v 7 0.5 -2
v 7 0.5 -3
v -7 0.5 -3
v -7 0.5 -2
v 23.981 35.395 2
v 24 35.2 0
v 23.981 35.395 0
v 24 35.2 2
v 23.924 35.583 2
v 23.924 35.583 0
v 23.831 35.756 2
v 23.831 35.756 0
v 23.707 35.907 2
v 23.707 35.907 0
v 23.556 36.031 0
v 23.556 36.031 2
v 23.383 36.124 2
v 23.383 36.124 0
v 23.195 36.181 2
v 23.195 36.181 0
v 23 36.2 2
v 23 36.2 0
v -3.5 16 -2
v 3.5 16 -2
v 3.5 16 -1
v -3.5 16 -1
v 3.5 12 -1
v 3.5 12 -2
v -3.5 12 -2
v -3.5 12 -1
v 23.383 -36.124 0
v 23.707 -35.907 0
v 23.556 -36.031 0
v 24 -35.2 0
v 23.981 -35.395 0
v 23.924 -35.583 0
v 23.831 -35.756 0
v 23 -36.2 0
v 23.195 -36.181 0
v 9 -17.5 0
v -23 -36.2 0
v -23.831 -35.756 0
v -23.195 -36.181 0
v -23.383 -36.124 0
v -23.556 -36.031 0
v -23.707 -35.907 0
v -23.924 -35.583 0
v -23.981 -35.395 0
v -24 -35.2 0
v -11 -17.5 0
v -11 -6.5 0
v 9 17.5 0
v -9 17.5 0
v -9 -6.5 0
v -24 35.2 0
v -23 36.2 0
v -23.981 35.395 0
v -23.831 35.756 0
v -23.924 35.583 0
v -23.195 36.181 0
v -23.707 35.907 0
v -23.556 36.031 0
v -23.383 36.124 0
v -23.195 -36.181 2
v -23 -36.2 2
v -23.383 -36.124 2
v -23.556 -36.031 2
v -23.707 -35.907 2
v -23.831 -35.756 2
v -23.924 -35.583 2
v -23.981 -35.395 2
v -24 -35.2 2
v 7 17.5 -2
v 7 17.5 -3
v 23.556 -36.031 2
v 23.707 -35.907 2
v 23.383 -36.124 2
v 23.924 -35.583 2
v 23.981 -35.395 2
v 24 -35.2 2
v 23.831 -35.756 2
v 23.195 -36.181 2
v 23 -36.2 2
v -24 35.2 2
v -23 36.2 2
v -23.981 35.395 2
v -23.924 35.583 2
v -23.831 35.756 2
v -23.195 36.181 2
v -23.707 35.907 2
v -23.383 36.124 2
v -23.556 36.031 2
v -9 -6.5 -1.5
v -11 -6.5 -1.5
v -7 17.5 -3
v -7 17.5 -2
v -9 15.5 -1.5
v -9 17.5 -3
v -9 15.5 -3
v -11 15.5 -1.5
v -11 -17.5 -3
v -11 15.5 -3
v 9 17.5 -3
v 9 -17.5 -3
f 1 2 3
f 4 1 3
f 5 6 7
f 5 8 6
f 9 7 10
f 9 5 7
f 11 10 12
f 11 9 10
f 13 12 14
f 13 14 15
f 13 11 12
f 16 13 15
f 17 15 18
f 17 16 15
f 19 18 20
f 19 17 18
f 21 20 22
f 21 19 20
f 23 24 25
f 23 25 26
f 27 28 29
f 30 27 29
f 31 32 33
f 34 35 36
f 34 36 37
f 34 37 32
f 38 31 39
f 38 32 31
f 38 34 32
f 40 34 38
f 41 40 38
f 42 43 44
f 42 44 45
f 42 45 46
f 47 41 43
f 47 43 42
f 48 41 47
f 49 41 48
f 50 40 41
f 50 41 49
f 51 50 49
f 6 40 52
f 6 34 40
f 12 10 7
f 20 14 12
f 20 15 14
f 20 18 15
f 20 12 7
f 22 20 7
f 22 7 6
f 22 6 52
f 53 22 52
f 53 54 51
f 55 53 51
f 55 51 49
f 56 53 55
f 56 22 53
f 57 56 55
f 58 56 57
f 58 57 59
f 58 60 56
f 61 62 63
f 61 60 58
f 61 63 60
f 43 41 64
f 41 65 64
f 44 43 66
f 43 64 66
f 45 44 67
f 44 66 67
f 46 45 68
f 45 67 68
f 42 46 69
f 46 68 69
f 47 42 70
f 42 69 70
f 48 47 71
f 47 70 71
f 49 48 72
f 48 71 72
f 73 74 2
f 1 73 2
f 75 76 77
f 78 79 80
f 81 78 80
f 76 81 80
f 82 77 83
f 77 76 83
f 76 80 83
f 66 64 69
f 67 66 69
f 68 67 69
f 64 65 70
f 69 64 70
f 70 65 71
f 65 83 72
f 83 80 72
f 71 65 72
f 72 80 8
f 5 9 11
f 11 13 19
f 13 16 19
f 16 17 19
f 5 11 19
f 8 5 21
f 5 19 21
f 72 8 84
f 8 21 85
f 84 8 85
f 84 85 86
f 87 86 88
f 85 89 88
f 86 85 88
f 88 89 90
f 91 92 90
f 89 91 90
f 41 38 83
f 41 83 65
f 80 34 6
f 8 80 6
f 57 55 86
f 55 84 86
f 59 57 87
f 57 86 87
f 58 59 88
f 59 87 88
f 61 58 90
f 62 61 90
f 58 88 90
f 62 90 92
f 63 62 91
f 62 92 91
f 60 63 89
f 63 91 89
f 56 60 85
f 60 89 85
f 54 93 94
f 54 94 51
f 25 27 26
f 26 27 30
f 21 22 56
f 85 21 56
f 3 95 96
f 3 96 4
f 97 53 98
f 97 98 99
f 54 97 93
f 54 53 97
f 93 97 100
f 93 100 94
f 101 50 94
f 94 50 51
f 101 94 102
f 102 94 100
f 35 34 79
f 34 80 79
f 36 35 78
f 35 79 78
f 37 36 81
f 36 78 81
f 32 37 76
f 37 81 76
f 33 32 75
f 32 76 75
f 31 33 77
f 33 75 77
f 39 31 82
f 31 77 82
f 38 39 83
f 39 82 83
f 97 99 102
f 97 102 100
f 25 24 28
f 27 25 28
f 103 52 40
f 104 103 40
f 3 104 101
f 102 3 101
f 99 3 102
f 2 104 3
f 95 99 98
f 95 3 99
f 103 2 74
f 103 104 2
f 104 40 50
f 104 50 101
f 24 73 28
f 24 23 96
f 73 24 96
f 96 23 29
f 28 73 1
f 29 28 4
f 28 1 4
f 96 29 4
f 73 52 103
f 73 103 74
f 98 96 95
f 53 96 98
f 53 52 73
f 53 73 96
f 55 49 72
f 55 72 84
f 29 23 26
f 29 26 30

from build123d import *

# Parameters (mm, degrees)
SKETCH_W        = 48
SKETCH_H        = 72.4
PAD_DEPTH       = 2
FILLET_R        = 1
SKETCH001_W     = 18
SKETCH001_H     = 35
PAD001_DEPTH    = 3
SKETCH002_W     = 14
SKETCH002_H     = 17
POCKET_DEPTH    = 1
SKETCH003_W     = 7
SKETCH003_H     = 4
POCKET001_DEPTH = 1
PAD002_DEPTH    = 2


with BuildPart() as ailettes:
    # Sketch → Pad (new body)
    with BuildSketch(Plane.XY):
        Rectangle(SKETCH_W, SKETCH_H)
    extrude(amount=PAD_DEPTH)

    # Fillet
    fillet_edges = [ailettes.edges().sort_by_distance(p)[0] for p in [
        (-24, 36.2, 1),
        (24, 36.2, 1),
        (24, -36.2, 1),
        (-24, -36.2, 1),
    ]]
    fillet(fillet_edges, radius=FILLET_R)

    # Sketch001 → Pad001 (new body)
    with BuildSketch(Plane(origin=(0, 0, 0), x_dir=(1, 0, 0), z_dir=(0, 0, -1))):
        Rectangle(SKETCH001_W, SKETCH001_H)
    extrude(amount=PAD001_DEPTH)

    # Sketch002 → Pocket (cut)
    with BuildSketch(Plane(origin=(0, 0, -3), x_dir=(1, 0, 0), z_dir=(0, 0, -1))):
        with Locations((0, -9)):
            Rectangle(SKETCH002_W, SKETCH002_H)
    extrude(amount=-POCKET_DEPTH, mode=Mode.SUBTRACT)

    # Sketch003 → Pocket001 (cut)
    with BuildSketch(Plane(origin=(0, 0, -2), x_dir=(1, 0, 0), z_dir=(0, 0, -1))):
        with Locations((0, -14)):
            Rectangle(SKETCH003_W, SKETCH003_H)
    extrude(amount=-POCKET001_DEPTH, mode=Mode.SUBTRACT)

    # Sketch004 → Pad002 (new body)
    with BuildSketch(Plane.YZ.offset(9)):
        Polygon((15.5, -3), (15.5, -1.5), (-6.5, -1.5), (-6.5, 0), (-17.5, 0), (-17.5, -3), align=None)
    extrude(amount=PAD002_DEPTH)


with BuildPart() as part_mirroring:
    # Part__Mirroring: instance of Ailettes
    add(ailettes.part.mirror(Plane(origin=(0, 0, 0), x_dir=(0, -1, 0), z_dir=(1, 0, 0))))


solid = part_mirroring.part
